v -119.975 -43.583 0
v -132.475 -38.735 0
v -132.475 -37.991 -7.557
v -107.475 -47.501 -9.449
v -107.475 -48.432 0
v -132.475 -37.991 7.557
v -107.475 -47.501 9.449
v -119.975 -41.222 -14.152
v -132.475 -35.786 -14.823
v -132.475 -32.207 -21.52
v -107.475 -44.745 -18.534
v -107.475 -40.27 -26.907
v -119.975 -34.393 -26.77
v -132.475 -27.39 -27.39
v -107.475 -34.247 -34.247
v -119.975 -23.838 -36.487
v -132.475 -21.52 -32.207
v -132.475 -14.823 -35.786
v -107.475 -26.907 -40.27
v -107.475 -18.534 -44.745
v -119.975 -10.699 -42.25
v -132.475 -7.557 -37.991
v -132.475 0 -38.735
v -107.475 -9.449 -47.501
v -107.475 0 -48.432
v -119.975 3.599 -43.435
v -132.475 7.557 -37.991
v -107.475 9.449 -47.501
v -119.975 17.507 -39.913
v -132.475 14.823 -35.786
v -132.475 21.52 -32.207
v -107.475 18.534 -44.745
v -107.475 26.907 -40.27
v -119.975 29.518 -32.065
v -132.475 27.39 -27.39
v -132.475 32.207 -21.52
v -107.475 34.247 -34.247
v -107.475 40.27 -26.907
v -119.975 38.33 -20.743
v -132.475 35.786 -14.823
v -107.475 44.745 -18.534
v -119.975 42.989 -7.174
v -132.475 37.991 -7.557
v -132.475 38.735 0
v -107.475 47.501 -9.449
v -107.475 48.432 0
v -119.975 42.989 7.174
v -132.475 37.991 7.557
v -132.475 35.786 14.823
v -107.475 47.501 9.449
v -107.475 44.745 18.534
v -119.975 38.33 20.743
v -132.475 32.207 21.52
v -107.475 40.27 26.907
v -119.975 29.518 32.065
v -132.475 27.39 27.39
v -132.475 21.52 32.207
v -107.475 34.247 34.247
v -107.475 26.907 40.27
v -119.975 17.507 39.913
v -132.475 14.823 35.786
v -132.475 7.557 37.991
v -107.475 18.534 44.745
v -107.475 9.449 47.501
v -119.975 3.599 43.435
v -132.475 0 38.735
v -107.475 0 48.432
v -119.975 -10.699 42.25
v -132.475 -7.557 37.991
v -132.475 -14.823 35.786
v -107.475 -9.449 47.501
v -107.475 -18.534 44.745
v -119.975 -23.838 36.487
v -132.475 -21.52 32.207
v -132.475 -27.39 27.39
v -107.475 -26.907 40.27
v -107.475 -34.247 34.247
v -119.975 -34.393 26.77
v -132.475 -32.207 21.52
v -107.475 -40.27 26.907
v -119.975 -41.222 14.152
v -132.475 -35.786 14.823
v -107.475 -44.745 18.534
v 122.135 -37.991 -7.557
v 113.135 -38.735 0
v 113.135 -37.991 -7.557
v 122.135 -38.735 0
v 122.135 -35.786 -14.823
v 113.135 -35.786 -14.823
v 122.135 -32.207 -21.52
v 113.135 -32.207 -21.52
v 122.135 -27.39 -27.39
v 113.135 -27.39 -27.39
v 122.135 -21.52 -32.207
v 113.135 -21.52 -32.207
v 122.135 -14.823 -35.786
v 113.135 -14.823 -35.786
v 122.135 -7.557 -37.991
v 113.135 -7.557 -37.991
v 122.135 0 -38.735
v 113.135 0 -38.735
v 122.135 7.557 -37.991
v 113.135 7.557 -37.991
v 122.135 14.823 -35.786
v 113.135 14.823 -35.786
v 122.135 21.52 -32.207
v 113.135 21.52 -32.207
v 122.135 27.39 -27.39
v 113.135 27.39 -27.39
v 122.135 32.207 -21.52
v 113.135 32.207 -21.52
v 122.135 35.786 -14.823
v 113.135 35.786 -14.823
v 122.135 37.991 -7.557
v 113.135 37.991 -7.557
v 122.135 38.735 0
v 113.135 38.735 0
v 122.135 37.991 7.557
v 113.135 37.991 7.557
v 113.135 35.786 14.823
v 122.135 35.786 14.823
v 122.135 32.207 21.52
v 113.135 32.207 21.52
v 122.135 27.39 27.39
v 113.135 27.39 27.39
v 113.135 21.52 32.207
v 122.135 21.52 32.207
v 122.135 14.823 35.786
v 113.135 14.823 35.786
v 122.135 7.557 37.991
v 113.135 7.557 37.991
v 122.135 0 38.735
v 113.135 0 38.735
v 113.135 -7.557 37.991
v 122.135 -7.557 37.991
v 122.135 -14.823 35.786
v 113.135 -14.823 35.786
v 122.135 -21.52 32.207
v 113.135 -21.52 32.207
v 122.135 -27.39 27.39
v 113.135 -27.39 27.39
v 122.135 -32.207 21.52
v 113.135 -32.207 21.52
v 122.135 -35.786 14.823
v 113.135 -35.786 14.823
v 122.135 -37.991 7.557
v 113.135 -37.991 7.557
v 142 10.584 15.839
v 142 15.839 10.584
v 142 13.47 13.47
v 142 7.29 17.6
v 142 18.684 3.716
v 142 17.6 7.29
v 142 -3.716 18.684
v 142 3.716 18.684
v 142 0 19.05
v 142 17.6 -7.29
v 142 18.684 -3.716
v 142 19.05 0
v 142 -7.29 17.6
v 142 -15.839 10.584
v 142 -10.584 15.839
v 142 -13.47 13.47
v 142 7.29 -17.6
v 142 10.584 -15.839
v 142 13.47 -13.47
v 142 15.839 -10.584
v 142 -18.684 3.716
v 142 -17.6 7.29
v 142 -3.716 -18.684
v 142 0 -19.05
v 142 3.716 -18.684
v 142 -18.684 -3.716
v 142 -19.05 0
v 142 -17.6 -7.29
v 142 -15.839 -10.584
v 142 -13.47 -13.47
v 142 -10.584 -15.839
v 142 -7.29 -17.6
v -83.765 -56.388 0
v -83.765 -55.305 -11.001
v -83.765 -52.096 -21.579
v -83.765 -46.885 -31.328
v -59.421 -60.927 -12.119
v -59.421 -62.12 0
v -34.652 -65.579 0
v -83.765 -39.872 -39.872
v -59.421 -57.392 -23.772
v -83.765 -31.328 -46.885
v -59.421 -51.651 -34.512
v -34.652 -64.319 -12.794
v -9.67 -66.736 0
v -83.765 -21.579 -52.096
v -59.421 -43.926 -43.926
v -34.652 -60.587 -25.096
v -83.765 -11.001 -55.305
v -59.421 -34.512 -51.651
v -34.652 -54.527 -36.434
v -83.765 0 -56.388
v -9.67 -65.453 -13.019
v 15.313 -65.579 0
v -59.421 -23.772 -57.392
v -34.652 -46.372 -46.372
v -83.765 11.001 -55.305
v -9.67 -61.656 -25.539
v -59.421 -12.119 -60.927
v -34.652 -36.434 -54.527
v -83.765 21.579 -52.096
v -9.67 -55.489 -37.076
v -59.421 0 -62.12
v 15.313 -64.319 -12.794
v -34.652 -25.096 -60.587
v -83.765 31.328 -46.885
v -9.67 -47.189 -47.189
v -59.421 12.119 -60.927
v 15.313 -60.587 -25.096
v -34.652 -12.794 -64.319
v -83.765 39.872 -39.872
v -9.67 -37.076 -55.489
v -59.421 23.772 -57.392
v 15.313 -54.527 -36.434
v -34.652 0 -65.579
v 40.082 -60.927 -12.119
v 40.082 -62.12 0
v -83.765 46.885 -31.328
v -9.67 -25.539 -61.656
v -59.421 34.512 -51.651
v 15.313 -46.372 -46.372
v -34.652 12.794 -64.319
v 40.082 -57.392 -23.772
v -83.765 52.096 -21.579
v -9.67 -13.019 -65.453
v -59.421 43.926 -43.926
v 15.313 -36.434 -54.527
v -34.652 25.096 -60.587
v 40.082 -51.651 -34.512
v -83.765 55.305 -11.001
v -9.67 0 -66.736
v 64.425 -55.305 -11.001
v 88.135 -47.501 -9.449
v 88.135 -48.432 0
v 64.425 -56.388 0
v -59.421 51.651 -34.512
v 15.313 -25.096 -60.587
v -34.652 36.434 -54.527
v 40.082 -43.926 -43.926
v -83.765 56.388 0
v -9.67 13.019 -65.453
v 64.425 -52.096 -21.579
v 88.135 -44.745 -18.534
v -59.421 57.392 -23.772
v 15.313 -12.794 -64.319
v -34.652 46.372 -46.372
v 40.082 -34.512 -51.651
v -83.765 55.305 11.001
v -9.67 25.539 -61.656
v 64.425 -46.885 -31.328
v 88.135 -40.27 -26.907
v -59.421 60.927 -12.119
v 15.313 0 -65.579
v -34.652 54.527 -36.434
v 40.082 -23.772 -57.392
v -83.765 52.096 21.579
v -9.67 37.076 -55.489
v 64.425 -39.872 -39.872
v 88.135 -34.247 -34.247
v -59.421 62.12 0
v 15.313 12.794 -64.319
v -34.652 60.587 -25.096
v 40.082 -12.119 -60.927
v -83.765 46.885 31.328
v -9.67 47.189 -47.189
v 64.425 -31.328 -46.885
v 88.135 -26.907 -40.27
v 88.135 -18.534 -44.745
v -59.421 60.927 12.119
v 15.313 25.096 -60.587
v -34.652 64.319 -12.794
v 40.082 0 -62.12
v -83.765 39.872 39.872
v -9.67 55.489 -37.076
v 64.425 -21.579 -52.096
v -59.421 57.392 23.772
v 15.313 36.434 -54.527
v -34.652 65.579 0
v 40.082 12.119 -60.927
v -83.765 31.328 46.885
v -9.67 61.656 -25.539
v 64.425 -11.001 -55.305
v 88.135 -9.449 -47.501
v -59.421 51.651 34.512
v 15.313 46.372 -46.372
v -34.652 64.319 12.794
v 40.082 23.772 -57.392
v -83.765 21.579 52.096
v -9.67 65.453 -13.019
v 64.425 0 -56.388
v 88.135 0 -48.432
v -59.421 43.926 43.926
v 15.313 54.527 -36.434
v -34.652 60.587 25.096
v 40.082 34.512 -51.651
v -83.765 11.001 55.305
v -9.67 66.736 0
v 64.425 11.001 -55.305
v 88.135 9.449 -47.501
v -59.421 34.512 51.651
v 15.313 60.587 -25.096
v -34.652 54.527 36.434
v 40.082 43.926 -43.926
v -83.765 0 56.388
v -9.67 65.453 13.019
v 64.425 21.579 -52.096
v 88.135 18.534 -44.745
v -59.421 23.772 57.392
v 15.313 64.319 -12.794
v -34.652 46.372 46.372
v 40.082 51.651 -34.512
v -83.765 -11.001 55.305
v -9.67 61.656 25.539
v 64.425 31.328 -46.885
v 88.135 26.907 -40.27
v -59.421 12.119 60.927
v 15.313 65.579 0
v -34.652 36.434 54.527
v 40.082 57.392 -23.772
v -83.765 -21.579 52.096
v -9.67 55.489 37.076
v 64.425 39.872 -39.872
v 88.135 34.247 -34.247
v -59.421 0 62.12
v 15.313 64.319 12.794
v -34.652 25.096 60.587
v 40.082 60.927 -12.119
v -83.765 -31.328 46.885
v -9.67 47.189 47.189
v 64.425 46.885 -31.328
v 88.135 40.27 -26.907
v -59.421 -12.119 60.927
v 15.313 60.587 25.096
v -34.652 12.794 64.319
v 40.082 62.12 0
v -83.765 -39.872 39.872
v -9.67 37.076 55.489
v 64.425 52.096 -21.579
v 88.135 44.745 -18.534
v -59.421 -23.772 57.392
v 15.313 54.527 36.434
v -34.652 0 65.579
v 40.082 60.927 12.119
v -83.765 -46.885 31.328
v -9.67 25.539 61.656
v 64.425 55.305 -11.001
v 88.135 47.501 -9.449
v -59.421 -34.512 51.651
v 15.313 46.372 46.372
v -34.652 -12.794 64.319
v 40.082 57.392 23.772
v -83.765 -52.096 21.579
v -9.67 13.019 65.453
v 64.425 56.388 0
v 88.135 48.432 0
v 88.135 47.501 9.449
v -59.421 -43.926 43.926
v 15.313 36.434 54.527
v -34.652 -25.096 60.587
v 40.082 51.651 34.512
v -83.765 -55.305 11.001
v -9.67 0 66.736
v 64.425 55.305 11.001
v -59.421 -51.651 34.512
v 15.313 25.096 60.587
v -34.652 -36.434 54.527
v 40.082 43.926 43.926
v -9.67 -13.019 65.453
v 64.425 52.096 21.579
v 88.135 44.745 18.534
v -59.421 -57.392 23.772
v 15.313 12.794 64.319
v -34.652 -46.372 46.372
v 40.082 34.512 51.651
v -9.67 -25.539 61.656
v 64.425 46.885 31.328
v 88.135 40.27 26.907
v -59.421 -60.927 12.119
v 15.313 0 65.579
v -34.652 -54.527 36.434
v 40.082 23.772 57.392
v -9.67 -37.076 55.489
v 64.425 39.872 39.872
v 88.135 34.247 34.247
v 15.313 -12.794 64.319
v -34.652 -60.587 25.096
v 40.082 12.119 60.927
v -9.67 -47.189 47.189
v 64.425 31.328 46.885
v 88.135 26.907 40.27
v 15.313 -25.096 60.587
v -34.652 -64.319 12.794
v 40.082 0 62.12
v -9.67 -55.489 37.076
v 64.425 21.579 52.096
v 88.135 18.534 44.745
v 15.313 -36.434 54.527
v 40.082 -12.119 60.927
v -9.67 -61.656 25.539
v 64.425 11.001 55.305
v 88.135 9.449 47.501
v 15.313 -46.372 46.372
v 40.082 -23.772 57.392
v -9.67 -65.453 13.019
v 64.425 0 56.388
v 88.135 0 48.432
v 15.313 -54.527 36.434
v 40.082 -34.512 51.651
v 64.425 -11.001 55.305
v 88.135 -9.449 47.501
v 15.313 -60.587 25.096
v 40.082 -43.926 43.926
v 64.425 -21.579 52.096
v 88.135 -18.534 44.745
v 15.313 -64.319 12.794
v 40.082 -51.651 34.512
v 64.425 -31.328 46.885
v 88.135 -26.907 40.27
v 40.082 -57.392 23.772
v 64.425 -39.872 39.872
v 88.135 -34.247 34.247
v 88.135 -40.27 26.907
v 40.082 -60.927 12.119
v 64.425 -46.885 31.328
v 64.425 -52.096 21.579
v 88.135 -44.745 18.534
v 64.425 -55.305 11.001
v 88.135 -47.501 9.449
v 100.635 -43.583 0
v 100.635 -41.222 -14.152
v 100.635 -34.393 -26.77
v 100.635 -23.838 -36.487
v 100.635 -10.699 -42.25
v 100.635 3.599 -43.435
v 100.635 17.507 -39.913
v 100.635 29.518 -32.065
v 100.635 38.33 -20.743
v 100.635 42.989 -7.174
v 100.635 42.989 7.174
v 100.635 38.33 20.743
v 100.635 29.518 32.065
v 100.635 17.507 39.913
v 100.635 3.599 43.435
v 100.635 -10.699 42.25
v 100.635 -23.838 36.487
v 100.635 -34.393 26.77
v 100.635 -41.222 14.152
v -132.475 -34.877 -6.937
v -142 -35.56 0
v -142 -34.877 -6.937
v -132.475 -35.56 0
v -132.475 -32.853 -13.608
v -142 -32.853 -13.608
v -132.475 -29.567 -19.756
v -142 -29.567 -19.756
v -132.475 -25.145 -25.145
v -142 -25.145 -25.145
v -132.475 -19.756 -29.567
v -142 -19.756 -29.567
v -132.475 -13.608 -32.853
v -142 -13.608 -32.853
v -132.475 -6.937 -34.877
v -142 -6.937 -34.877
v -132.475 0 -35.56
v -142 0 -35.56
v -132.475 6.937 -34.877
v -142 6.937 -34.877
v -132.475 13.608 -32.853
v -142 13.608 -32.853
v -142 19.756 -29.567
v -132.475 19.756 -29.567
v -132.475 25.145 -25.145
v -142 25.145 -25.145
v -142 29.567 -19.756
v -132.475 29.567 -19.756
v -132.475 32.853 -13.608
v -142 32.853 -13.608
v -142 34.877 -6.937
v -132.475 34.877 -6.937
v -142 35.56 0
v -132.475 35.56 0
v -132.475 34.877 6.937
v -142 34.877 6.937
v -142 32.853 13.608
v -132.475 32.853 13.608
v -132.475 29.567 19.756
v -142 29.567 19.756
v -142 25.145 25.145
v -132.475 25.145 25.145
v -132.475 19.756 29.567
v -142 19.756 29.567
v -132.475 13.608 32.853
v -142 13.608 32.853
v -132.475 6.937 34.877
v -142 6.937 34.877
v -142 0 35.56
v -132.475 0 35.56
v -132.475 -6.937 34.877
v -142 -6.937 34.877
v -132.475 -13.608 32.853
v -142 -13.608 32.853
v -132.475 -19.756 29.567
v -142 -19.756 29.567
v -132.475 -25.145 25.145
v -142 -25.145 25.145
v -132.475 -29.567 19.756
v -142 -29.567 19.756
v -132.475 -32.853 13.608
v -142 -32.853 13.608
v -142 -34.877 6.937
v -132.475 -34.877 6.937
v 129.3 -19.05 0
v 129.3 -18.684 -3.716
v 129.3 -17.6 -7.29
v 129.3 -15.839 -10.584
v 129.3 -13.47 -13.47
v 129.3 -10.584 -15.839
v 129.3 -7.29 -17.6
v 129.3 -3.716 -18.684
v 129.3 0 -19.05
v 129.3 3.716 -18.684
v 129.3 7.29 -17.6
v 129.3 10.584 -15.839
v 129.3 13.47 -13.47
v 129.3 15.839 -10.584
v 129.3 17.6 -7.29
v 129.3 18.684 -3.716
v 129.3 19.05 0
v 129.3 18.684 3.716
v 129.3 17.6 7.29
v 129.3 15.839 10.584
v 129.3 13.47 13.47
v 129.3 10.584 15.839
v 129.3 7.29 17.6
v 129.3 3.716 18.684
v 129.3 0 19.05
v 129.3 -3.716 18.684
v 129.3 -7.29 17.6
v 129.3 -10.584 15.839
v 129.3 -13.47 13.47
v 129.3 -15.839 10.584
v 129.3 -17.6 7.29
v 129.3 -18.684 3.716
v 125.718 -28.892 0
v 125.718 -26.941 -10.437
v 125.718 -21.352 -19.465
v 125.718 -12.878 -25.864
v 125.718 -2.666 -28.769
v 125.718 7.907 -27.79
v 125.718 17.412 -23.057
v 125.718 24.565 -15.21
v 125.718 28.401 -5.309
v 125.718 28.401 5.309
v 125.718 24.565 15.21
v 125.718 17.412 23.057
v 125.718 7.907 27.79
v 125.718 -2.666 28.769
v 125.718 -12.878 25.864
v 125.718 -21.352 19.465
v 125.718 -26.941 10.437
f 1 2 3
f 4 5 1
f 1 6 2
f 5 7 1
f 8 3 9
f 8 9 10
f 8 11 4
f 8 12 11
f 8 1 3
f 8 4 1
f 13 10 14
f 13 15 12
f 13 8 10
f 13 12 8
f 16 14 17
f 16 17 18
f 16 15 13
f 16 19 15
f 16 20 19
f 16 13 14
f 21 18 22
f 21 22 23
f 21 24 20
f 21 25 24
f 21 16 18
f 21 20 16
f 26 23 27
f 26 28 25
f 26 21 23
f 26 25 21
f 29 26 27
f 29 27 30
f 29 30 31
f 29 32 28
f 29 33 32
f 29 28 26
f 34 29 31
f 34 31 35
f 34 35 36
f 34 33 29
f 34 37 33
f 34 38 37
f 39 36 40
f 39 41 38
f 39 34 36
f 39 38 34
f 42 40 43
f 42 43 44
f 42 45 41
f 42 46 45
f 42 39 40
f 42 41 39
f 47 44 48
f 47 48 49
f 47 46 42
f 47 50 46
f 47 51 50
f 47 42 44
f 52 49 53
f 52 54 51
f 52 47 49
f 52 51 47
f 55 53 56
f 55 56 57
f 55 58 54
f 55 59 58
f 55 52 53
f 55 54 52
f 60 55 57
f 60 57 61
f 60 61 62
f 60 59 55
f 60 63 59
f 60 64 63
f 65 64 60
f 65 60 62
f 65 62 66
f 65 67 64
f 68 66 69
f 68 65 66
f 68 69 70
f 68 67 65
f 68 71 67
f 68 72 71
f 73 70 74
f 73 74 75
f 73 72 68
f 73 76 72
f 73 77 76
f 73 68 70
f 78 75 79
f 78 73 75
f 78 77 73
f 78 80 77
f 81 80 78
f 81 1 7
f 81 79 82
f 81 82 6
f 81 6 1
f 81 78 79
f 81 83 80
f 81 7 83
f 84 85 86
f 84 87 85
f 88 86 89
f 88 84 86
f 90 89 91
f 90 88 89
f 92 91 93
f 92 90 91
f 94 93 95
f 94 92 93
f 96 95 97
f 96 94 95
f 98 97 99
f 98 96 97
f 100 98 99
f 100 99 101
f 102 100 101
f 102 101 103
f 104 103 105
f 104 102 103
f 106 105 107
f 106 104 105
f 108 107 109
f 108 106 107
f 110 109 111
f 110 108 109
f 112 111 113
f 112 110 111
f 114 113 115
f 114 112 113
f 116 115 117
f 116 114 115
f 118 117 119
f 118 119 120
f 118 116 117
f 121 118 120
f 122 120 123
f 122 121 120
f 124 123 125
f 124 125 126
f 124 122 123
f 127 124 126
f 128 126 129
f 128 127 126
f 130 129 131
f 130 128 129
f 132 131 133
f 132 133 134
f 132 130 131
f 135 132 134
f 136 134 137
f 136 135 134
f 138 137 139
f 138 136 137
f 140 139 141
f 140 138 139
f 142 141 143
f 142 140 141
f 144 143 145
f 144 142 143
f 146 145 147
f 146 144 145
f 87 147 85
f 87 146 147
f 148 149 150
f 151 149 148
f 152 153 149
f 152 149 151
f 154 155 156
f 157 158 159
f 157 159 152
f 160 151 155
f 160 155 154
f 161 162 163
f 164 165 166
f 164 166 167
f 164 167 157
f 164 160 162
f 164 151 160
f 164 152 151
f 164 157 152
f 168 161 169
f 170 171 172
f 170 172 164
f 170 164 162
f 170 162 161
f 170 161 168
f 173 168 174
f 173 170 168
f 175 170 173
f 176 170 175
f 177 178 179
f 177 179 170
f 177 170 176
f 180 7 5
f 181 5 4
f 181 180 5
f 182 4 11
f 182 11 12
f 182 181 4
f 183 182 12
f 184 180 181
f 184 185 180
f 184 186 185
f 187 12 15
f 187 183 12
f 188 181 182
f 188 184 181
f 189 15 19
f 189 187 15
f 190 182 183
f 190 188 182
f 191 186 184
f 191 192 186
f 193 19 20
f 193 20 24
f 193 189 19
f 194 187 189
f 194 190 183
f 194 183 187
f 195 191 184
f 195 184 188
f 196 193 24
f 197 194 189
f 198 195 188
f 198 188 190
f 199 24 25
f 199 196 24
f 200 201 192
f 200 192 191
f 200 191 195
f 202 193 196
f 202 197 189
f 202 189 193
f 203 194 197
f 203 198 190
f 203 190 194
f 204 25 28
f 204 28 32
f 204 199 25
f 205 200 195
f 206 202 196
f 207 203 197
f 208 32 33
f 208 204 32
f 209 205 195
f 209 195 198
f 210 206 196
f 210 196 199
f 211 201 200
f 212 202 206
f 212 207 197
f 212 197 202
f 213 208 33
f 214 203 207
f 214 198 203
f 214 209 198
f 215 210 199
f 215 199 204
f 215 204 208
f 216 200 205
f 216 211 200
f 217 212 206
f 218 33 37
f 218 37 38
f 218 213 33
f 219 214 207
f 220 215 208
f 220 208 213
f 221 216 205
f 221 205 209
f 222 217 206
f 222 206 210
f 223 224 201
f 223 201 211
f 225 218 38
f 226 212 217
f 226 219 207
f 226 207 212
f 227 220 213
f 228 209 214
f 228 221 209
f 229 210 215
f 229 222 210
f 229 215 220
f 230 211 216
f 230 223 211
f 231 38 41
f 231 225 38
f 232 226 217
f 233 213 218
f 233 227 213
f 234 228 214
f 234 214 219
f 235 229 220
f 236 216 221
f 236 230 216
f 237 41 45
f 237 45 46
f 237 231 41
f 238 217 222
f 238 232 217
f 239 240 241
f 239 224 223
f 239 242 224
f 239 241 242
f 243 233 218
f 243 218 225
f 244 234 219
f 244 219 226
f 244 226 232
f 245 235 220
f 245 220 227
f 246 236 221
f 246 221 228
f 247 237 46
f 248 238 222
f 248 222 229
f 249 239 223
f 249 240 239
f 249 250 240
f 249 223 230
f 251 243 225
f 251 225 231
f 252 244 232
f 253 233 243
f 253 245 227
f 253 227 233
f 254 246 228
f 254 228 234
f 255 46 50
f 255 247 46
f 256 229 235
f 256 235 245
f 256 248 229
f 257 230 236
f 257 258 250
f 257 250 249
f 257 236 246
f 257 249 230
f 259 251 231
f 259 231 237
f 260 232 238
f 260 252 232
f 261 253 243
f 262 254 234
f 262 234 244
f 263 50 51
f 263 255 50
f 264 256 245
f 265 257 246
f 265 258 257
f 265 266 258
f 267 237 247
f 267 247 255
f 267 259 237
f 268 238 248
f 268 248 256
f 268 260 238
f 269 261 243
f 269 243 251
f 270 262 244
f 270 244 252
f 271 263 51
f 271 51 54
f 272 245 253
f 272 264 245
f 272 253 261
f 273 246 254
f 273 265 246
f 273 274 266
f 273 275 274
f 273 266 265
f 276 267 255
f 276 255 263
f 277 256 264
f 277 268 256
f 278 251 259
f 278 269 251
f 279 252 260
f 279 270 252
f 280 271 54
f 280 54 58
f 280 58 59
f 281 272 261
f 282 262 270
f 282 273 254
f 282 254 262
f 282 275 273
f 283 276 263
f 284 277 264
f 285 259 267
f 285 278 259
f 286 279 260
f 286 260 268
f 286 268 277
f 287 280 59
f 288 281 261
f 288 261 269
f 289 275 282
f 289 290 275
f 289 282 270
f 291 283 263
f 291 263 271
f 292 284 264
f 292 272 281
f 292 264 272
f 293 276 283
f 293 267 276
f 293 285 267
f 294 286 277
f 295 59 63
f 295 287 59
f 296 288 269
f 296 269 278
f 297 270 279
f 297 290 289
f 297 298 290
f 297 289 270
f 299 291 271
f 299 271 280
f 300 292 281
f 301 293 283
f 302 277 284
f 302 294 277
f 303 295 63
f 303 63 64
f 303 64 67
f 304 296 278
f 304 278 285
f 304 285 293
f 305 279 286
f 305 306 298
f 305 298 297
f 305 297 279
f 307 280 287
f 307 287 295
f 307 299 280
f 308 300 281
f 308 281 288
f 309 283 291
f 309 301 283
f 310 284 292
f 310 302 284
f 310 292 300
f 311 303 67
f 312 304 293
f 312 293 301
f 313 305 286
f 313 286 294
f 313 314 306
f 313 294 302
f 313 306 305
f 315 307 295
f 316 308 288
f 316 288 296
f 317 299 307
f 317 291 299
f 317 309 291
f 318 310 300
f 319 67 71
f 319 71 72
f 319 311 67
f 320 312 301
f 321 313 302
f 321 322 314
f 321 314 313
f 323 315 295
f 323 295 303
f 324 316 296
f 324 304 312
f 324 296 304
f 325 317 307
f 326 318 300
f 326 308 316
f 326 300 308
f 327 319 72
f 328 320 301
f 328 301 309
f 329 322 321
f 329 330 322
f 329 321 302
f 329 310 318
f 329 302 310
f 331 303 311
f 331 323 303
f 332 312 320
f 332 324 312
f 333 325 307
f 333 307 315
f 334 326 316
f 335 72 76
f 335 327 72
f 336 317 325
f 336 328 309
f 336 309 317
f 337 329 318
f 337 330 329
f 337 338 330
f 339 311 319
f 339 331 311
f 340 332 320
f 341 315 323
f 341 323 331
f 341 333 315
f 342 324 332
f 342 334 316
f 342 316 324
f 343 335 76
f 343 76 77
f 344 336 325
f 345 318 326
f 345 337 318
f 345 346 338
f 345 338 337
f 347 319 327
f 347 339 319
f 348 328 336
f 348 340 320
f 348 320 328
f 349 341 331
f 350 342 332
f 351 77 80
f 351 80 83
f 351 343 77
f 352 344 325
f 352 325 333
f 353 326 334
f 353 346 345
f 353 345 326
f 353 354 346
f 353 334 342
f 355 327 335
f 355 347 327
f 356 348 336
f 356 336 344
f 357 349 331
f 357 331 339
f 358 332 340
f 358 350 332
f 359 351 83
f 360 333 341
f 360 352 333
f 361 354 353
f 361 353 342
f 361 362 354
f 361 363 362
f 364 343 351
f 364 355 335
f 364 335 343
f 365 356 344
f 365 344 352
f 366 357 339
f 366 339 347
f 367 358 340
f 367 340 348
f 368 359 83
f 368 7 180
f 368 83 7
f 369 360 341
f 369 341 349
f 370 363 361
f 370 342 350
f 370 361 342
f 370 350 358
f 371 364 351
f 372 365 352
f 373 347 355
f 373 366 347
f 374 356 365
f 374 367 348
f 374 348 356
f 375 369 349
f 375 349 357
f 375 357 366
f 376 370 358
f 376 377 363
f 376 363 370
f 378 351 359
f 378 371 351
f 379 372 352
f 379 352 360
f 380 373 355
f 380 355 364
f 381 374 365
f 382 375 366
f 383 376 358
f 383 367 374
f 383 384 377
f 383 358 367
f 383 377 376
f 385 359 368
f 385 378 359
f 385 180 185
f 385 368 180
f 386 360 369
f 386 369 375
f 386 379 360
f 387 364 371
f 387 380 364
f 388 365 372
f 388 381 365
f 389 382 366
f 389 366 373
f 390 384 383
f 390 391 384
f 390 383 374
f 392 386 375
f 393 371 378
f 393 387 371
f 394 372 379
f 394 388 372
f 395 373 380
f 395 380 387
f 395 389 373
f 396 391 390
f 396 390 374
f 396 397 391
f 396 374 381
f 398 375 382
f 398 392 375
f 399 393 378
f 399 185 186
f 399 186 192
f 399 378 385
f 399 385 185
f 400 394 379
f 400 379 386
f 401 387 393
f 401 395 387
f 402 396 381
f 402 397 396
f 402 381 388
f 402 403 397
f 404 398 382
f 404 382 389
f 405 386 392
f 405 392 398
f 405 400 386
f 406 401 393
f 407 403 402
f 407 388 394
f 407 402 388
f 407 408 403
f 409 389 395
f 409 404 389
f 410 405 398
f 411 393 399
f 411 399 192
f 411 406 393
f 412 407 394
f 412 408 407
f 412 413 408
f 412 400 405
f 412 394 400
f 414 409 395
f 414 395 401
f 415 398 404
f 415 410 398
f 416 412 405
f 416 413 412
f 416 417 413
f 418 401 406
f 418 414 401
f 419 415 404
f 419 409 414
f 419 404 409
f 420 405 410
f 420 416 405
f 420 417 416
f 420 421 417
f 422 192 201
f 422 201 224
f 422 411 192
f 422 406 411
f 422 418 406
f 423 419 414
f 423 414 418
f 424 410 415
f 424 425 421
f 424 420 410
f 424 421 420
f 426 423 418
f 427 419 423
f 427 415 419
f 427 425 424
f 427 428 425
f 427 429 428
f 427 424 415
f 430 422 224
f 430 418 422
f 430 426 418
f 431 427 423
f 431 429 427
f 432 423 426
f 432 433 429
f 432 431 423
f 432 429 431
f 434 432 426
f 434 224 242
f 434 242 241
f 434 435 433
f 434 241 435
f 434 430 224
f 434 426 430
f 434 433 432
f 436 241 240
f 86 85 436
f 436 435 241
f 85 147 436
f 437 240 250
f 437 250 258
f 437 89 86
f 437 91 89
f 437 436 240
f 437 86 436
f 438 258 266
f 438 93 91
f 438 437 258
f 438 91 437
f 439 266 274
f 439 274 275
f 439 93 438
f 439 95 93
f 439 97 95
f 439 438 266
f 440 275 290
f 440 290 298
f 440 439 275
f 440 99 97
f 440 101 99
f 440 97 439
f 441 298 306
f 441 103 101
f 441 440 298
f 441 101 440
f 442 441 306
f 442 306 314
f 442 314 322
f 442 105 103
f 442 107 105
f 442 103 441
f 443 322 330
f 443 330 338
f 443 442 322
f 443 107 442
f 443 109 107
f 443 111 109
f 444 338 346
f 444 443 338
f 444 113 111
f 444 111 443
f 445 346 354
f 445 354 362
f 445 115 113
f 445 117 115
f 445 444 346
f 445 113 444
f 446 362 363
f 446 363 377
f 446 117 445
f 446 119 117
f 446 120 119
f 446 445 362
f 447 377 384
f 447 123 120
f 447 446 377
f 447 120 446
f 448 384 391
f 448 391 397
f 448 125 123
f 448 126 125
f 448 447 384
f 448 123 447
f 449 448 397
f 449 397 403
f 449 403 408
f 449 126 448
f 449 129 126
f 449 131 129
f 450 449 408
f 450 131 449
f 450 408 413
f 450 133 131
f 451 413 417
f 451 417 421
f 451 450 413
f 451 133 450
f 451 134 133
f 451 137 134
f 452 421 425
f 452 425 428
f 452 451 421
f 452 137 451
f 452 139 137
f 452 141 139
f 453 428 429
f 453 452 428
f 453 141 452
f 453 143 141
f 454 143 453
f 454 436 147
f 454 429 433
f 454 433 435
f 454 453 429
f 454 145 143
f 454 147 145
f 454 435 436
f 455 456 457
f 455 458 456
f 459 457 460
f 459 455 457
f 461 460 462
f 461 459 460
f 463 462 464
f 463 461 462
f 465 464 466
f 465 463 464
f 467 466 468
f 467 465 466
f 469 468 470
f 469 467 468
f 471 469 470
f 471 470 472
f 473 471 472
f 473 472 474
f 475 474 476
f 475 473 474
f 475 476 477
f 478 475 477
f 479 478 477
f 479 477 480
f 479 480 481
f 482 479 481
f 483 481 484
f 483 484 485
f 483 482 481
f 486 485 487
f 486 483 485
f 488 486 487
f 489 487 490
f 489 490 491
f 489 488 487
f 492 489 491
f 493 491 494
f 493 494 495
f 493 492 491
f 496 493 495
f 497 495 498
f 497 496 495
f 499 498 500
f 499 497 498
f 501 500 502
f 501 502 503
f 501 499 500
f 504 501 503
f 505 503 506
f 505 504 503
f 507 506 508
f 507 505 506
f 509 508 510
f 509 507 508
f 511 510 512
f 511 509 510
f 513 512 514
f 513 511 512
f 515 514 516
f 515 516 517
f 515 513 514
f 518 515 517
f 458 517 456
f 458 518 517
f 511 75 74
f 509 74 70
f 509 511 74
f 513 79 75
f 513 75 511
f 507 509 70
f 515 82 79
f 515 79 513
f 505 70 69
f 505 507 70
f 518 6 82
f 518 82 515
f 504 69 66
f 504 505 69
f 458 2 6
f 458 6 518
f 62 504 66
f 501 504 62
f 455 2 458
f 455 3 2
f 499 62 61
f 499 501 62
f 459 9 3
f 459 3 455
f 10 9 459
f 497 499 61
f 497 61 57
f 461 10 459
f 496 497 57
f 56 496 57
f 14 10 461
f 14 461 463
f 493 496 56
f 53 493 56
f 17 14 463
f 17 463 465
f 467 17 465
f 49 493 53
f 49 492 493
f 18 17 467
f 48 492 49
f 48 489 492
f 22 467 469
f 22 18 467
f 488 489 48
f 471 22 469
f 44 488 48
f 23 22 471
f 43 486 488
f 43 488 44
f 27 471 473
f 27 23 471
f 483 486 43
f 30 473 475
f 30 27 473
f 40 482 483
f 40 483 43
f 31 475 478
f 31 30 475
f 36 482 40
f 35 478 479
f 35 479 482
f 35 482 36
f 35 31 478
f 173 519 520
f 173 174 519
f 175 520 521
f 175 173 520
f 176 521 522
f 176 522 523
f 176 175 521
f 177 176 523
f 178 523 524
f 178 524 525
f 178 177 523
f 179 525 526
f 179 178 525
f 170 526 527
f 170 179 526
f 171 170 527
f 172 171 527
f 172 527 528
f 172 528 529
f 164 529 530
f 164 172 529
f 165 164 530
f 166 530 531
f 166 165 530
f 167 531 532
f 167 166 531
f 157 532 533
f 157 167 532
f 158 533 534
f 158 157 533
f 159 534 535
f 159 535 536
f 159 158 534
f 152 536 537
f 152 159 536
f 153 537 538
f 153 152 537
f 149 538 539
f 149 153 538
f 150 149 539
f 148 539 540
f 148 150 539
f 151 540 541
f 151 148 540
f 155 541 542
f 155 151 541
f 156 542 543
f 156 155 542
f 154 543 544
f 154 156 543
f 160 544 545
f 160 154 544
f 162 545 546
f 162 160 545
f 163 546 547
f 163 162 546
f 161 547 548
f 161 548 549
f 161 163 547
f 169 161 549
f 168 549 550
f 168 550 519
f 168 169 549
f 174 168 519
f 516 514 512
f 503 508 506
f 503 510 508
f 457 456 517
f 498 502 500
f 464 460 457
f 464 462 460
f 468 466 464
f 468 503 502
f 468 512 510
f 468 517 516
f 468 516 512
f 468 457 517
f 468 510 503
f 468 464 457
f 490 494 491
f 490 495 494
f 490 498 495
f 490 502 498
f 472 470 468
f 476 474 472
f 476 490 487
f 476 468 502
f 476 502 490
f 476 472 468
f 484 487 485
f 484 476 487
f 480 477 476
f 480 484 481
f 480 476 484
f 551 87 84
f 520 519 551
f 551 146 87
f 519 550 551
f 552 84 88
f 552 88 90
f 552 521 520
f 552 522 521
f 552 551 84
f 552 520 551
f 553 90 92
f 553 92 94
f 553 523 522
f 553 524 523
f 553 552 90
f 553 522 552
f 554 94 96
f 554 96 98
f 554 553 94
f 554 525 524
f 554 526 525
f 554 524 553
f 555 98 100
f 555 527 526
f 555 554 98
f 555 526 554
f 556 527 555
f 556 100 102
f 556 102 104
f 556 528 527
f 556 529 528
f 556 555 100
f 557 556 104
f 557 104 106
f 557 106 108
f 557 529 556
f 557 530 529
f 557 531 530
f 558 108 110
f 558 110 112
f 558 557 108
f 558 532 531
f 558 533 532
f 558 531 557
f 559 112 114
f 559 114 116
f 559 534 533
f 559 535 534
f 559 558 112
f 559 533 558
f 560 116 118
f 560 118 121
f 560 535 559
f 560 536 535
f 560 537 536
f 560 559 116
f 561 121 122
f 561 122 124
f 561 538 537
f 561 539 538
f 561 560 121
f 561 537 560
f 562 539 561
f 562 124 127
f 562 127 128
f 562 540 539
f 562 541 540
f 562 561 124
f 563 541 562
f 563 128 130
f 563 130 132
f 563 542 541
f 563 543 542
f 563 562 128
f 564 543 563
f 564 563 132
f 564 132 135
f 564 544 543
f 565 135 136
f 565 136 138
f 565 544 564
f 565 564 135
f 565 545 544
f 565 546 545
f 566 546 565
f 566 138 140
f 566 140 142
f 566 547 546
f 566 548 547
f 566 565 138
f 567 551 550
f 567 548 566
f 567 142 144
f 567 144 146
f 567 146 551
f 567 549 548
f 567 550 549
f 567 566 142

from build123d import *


with BuildPart() as part:
    # Sketch1 → Revolve1 (revolve)
    with BuildSketch(Plane.XY, mode=Mode.PRIVATE) as revolve1_sk:
        with BuildLine():
            Line((-142, 35.56), (-132.475, 35.56))
            Line((-132.475, 35.56), (-132.475, 38.735))
            Line((-132.475, 38.735), (-107.475, 48.431888695))
            ThreePointArc((-107.475, 48.431888695), (-9.669877031, 66.73566879), (88.135245938, 48.431888695))
            Line((88.135245938, 48.431888695), (113.135245938, 38.735))
            Line((113.135245938, 38.735), (122.135245938, 38.735))
            Line((122.135245938, 38.735), (129.3, 19.05))
            Line((129.3, 19.05), (142, 19.05))
            Line((142, 19.05), (142, 0))
            Line((142, 0), (-142, 0))
            Line((-142, 0), (-142, 35.56))
        make_face()
    revolve(revolve1_sk.sketch.rotate(Axis((142, 0, 0), (1, 0, 0)), 180), axis=Axis((142, 0, 0), (1, 0, 0)))


solid = part.part
